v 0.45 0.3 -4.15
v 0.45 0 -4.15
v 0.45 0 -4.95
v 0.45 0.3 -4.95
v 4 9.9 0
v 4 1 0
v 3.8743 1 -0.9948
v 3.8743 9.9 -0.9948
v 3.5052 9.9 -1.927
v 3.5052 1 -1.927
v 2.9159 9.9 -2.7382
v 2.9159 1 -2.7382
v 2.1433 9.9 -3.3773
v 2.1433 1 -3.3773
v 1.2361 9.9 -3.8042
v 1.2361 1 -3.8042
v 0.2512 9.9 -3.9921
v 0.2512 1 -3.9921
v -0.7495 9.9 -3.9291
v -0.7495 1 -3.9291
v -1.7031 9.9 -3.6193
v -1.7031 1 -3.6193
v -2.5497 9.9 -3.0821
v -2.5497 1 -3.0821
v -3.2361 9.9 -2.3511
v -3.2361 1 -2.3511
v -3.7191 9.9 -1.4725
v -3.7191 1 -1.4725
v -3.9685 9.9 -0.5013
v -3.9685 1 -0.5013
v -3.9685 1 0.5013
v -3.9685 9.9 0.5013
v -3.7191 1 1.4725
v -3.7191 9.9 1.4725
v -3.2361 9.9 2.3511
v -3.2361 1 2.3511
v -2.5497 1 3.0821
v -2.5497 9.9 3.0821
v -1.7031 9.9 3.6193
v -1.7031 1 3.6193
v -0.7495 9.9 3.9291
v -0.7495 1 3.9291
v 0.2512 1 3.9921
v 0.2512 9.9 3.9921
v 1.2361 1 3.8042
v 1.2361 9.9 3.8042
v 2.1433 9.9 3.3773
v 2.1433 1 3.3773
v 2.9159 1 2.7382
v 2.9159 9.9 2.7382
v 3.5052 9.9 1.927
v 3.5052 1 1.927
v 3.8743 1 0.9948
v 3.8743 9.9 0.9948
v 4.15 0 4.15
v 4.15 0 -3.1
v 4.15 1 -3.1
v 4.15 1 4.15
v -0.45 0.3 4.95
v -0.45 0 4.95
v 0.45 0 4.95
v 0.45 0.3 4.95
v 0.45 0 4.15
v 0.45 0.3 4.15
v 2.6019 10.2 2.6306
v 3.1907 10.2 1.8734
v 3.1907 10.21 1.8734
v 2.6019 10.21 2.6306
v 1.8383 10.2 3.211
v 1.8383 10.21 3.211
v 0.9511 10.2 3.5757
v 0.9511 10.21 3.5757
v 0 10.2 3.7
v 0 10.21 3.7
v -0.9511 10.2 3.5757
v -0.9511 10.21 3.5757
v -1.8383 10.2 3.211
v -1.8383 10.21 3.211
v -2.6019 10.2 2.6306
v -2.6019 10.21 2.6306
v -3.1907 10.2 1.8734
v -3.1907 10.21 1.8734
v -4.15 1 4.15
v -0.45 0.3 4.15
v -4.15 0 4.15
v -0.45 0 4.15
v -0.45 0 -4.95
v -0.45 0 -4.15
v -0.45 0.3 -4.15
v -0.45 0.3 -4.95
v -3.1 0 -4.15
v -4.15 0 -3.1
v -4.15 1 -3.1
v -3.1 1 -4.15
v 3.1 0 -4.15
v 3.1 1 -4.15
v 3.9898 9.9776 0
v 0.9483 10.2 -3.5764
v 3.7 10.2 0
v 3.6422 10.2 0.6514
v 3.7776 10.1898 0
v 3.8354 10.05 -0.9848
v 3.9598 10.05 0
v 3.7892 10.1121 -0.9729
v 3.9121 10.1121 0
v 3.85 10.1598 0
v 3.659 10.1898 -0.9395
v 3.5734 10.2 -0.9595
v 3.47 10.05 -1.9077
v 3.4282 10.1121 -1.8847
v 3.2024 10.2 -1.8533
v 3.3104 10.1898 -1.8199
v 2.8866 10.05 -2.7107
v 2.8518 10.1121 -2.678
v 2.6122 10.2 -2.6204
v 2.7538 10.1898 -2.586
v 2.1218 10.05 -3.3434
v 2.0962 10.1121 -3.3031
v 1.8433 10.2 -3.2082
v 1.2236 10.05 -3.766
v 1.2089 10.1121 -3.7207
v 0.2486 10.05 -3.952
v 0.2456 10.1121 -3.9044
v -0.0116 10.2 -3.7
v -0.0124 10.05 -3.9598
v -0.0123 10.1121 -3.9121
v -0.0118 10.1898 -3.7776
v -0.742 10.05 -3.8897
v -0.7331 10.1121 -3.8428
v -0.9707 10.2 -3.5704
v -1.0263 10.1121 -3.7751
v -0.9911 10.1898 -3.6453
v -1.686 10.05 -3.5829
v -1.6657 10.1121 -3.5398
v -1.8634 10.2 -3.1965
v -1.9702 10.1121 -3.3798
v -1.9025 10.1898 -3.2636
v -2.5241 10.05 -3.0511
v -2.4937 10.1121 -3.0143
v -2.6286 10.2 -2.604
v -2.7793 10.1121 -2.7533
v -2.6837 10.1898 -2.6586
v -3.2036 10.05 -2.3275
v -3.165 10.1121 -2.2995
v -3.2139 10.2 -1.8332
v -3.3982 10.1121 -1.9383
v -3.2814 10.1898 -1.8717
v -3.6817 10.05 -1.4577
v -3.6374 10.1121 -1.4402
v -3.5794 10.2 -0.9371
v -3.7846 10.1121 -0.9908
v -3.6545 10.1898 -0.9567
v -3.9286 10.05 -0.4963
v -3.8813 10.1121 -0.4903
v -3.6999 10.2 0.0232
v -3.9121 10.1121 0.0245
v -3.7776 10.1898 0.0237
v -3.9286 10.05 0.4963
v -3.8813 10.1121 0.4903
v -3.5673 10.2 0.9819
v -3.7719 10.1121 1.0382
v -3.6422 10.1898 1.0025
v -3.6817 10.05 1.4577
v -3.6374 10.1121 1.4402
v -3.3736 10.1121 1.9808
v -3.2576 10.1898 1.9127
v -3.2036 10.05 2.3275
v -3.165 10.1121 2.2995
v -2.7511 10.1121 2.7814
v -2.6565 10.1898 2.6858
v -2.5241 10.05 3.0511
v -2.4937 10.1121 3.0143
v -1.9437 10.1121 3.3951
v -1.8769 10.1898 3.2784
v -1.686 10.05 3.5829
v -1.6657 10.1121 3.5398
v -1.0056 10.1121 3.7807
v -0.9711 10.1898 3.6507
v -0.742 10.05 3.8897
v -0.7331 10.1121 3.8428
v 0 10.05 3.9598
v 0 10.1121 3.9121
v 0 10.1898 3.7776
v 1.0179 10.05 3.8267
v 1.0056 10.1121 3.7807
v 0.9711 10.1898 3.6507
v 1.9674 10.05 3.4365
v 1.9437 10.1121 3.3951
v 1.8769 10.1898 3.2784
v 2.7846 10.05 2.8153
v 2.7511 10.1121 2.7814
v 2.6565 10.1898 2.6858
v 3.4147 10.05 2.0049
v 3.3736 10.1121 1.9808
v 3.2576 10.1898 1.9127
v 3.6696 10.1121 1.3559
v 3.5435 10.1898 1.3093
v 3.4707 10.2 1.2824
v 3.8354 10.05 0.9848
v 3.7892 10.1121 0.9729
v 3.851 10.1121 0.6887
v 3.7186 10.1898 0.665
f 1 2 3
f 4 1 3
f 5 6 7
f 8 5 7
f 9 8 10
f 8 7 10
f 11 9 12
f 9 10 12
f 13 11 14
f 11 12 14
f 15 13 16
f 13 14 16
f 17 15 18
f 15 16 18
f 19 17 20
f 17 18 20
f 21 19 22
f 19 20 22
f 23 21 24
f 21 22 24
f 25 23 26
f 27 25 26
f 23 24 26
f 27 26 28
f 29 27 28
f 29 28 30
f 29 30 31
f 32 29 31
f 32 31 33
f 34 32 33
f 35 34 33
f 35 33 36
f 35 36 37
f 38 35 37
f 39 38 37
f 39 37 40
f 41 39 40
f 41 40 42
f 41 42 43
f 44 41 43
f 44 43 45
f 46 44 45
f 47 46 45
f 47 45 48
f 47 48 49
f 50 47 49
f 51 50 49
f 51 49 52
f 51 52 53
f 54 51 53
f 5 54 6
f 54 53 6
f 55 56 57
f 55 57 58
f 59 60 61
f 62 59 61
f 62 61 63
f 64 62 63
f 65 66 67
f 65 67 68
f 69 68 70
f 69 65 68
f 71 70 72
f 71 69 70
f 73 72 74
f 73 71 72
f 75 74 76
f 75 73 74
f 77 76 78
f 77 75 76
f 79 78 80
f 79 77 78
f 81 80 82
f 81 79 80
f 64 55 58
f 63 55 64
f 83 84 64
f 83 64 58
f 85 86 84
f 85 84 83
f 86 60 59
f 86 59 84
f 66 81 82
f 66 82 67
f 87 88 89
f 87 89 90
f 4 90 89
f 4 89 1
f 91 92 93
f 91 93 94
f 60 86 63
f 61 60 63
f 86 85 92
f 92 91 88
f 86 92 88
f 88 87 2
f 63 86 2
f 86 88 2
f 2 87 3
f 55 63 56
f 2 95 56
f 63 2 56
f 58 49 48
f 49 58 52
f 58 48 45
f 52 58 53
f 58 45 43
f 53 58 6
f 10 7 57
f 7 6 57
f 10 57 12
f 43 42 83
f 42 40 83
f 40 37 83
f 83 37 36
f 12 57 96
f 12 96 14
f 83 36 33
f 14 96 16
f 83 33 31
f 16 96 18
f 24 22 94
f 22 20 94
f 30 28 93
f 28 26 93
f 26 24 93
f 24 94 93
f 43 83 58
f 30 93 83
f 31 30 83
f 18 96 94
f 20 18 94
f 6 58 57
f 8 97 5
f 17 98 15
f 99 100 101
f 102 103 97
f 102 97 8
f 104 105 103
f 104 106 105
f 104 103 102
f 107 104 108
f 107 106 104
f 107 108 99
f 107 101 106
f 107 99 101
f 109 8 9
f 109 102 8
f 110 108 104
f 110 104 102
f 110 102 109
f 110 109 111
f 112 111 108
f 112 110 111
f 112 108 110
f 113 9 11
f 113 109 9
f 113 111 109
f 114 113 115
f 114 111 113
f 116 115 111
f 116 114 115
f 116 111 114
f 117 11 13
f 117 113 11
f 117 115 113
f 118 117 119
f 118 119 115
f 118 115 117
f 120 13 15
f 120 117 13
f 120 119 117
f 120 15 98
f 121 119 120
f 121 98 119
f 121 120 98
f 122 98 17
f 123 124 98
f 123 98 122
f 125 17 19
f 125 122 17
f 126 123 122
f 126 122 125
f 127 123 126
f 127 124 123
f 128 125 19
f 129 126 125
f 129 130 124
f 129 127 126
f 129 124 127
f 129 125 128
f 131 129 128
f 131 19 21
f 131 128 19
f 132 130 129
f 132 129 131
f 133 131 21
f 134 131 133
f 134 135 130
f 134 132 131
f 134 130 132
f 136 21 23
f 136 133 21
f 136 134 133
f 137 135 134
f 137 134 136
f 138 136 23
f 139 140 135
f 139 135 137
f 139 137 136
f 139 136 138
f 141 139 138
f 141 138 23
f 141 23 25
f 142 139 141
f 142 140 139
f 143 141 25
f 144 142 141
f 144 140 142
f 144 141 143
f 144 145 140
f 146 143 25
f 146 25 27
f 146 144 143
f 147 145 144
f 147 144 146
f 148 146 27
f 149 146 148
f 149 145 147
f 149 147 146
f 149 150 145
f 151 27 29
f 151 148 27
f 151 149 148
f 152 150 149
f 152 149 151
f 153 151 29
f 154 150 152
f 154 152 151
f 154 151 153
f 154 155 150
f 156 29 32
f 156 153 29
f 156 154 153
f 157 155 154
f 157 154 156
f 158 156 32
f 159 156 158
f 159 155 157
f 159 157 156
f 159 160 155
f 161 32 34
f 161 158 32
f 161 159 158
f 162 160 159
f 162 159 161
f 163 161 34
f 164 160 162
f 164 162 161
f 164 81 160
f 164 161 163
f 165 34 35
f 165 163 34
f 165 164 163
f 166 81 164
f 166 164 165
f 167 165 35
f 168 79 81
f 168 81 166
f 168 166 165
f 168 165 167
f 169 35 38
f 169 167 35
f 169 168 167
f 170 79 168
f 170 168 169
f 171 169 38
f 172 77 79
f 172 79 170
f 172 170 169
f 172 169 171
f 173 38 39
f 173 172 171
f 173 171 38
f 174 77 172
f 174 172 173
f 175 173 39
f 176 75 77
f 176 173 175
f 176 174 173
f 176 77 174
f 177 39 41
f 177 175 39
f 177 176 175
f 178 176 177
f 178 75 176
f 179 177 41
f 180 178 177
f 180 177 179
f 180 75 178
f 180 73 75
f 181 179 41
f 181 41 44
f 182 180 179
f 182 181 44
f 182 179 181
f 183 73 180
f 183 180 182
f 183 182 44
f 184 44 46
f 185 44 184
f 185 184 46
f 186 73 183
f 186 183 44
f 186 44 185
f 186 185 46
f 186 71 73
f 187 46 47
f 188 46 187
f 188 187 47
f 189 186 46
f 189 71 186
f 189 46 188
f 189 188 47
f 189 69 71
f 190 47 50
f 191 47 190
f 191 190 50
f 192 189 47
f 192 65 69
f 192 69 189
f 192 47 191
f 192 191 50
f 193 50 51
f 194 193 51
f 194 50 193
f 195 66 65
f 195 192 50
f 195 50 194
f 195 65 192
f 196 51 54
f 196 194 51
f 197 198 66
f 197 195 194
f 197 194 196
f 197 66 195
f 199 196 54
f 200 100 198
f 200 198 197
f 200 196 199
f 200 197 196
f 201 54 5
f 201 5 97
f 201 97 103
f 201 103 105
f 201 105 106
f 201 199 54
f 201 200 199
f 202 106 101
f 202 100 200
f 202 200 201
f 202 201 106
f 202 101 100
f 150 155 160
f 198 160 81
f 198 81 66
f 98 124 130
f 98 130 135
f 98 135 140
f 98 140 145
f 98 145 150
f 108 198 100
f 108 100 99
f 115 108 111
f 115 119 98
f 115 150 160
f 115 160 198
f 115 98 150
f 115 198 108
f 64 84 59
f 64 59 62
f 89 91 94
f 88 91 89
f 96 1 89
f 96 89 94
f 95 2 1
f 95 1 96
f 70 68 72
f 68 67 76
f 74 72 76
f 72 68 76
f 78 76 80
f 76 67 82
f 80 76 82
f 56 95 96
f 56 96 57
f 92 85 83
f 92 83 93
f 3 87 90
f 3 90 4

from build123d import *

# Parameters (mm, degrees)
BOSS_EXTRUDE1_DEPTH = 1
SKETCH3_R           = 4
BOSS_EXTRUDE2_DEPTH = 10.2
FILLET1_R           = 0.3
SKETCH4_W           = 0.9
SKETCH4_H           = 3.4
BOSS_EXTRUDE3_DEPTH = 0.3
BOSS_EXTRUDE4_DEPTH = 0.01


with BuildPart() as part:
    # Sketch2 → Boss-Extrude1 (new body)
    with BuildSketch(Plane(origin=(0, 0, 0), x_dir=(1, 0, 0), z_dir=(0, 1, 0))):
        Polygon((4.15, -4.15), (-4.15, -4.15), (-4.15, 3.1), (-3.1, 4.15), (3.1, 4.15), (4.15, 3.1), align=None)
    extrude(amount=BOSS_EXTRUDE1_DEPTH)

    # Sketch3 → Boss-Extrude2 (add)
    with BuildSketch(Plane(origin=(0, 0, 0), x_dir=(1, 0, 0), z_dir=(0, 1, 0))):
        Circle(SKETCH3_R)
    extrude(amount=BOSS_EXTRUDE2_DEPTH)

    # Fillet1
    fillet1_edges = [part.edges().sort_by_distance(p)[0] for p in [
        (-4, 10.2, 0),
    ]]
    fillet(fillet1_edges, radius=FILLET1_R)

    # Sketch4 → Boss-Extrude3 (add)
    with BuildSketch(Plane(origin=(0, 0, 0), x_dir=(1, 0, 0), z_dir=(0, 1, 0))):
        with Locations((0, 3.25)):
            Rectangle(SKETCH4_W, SKETCH4_H)
        with Locations((0, -3.25)):
            Rectangle(SKETCH4_W, SKETCH4_H)
    extrude(amount=BOSS_EXTRUDE3_DEPTH)

    # Sketch5 → Boss-Extrude4 (add)
    with BuildSketch(Plane(origin=(0, 10.2, 0), x_dir=(1, 0, 0), z_dir=(0, 1, 0))):
        with BuildLine():
            Line((-3.190682189, -1.873378544), (3.190682189, -1.873378544))
            ThreePointArc((3.190682189, -1.873378544), (0, -3.7), (-3.190682189, -1.873378544))
        make_face()
    extrude(amount=BOSS_EXTRUDE4_DEPTH)


solid = part.part
